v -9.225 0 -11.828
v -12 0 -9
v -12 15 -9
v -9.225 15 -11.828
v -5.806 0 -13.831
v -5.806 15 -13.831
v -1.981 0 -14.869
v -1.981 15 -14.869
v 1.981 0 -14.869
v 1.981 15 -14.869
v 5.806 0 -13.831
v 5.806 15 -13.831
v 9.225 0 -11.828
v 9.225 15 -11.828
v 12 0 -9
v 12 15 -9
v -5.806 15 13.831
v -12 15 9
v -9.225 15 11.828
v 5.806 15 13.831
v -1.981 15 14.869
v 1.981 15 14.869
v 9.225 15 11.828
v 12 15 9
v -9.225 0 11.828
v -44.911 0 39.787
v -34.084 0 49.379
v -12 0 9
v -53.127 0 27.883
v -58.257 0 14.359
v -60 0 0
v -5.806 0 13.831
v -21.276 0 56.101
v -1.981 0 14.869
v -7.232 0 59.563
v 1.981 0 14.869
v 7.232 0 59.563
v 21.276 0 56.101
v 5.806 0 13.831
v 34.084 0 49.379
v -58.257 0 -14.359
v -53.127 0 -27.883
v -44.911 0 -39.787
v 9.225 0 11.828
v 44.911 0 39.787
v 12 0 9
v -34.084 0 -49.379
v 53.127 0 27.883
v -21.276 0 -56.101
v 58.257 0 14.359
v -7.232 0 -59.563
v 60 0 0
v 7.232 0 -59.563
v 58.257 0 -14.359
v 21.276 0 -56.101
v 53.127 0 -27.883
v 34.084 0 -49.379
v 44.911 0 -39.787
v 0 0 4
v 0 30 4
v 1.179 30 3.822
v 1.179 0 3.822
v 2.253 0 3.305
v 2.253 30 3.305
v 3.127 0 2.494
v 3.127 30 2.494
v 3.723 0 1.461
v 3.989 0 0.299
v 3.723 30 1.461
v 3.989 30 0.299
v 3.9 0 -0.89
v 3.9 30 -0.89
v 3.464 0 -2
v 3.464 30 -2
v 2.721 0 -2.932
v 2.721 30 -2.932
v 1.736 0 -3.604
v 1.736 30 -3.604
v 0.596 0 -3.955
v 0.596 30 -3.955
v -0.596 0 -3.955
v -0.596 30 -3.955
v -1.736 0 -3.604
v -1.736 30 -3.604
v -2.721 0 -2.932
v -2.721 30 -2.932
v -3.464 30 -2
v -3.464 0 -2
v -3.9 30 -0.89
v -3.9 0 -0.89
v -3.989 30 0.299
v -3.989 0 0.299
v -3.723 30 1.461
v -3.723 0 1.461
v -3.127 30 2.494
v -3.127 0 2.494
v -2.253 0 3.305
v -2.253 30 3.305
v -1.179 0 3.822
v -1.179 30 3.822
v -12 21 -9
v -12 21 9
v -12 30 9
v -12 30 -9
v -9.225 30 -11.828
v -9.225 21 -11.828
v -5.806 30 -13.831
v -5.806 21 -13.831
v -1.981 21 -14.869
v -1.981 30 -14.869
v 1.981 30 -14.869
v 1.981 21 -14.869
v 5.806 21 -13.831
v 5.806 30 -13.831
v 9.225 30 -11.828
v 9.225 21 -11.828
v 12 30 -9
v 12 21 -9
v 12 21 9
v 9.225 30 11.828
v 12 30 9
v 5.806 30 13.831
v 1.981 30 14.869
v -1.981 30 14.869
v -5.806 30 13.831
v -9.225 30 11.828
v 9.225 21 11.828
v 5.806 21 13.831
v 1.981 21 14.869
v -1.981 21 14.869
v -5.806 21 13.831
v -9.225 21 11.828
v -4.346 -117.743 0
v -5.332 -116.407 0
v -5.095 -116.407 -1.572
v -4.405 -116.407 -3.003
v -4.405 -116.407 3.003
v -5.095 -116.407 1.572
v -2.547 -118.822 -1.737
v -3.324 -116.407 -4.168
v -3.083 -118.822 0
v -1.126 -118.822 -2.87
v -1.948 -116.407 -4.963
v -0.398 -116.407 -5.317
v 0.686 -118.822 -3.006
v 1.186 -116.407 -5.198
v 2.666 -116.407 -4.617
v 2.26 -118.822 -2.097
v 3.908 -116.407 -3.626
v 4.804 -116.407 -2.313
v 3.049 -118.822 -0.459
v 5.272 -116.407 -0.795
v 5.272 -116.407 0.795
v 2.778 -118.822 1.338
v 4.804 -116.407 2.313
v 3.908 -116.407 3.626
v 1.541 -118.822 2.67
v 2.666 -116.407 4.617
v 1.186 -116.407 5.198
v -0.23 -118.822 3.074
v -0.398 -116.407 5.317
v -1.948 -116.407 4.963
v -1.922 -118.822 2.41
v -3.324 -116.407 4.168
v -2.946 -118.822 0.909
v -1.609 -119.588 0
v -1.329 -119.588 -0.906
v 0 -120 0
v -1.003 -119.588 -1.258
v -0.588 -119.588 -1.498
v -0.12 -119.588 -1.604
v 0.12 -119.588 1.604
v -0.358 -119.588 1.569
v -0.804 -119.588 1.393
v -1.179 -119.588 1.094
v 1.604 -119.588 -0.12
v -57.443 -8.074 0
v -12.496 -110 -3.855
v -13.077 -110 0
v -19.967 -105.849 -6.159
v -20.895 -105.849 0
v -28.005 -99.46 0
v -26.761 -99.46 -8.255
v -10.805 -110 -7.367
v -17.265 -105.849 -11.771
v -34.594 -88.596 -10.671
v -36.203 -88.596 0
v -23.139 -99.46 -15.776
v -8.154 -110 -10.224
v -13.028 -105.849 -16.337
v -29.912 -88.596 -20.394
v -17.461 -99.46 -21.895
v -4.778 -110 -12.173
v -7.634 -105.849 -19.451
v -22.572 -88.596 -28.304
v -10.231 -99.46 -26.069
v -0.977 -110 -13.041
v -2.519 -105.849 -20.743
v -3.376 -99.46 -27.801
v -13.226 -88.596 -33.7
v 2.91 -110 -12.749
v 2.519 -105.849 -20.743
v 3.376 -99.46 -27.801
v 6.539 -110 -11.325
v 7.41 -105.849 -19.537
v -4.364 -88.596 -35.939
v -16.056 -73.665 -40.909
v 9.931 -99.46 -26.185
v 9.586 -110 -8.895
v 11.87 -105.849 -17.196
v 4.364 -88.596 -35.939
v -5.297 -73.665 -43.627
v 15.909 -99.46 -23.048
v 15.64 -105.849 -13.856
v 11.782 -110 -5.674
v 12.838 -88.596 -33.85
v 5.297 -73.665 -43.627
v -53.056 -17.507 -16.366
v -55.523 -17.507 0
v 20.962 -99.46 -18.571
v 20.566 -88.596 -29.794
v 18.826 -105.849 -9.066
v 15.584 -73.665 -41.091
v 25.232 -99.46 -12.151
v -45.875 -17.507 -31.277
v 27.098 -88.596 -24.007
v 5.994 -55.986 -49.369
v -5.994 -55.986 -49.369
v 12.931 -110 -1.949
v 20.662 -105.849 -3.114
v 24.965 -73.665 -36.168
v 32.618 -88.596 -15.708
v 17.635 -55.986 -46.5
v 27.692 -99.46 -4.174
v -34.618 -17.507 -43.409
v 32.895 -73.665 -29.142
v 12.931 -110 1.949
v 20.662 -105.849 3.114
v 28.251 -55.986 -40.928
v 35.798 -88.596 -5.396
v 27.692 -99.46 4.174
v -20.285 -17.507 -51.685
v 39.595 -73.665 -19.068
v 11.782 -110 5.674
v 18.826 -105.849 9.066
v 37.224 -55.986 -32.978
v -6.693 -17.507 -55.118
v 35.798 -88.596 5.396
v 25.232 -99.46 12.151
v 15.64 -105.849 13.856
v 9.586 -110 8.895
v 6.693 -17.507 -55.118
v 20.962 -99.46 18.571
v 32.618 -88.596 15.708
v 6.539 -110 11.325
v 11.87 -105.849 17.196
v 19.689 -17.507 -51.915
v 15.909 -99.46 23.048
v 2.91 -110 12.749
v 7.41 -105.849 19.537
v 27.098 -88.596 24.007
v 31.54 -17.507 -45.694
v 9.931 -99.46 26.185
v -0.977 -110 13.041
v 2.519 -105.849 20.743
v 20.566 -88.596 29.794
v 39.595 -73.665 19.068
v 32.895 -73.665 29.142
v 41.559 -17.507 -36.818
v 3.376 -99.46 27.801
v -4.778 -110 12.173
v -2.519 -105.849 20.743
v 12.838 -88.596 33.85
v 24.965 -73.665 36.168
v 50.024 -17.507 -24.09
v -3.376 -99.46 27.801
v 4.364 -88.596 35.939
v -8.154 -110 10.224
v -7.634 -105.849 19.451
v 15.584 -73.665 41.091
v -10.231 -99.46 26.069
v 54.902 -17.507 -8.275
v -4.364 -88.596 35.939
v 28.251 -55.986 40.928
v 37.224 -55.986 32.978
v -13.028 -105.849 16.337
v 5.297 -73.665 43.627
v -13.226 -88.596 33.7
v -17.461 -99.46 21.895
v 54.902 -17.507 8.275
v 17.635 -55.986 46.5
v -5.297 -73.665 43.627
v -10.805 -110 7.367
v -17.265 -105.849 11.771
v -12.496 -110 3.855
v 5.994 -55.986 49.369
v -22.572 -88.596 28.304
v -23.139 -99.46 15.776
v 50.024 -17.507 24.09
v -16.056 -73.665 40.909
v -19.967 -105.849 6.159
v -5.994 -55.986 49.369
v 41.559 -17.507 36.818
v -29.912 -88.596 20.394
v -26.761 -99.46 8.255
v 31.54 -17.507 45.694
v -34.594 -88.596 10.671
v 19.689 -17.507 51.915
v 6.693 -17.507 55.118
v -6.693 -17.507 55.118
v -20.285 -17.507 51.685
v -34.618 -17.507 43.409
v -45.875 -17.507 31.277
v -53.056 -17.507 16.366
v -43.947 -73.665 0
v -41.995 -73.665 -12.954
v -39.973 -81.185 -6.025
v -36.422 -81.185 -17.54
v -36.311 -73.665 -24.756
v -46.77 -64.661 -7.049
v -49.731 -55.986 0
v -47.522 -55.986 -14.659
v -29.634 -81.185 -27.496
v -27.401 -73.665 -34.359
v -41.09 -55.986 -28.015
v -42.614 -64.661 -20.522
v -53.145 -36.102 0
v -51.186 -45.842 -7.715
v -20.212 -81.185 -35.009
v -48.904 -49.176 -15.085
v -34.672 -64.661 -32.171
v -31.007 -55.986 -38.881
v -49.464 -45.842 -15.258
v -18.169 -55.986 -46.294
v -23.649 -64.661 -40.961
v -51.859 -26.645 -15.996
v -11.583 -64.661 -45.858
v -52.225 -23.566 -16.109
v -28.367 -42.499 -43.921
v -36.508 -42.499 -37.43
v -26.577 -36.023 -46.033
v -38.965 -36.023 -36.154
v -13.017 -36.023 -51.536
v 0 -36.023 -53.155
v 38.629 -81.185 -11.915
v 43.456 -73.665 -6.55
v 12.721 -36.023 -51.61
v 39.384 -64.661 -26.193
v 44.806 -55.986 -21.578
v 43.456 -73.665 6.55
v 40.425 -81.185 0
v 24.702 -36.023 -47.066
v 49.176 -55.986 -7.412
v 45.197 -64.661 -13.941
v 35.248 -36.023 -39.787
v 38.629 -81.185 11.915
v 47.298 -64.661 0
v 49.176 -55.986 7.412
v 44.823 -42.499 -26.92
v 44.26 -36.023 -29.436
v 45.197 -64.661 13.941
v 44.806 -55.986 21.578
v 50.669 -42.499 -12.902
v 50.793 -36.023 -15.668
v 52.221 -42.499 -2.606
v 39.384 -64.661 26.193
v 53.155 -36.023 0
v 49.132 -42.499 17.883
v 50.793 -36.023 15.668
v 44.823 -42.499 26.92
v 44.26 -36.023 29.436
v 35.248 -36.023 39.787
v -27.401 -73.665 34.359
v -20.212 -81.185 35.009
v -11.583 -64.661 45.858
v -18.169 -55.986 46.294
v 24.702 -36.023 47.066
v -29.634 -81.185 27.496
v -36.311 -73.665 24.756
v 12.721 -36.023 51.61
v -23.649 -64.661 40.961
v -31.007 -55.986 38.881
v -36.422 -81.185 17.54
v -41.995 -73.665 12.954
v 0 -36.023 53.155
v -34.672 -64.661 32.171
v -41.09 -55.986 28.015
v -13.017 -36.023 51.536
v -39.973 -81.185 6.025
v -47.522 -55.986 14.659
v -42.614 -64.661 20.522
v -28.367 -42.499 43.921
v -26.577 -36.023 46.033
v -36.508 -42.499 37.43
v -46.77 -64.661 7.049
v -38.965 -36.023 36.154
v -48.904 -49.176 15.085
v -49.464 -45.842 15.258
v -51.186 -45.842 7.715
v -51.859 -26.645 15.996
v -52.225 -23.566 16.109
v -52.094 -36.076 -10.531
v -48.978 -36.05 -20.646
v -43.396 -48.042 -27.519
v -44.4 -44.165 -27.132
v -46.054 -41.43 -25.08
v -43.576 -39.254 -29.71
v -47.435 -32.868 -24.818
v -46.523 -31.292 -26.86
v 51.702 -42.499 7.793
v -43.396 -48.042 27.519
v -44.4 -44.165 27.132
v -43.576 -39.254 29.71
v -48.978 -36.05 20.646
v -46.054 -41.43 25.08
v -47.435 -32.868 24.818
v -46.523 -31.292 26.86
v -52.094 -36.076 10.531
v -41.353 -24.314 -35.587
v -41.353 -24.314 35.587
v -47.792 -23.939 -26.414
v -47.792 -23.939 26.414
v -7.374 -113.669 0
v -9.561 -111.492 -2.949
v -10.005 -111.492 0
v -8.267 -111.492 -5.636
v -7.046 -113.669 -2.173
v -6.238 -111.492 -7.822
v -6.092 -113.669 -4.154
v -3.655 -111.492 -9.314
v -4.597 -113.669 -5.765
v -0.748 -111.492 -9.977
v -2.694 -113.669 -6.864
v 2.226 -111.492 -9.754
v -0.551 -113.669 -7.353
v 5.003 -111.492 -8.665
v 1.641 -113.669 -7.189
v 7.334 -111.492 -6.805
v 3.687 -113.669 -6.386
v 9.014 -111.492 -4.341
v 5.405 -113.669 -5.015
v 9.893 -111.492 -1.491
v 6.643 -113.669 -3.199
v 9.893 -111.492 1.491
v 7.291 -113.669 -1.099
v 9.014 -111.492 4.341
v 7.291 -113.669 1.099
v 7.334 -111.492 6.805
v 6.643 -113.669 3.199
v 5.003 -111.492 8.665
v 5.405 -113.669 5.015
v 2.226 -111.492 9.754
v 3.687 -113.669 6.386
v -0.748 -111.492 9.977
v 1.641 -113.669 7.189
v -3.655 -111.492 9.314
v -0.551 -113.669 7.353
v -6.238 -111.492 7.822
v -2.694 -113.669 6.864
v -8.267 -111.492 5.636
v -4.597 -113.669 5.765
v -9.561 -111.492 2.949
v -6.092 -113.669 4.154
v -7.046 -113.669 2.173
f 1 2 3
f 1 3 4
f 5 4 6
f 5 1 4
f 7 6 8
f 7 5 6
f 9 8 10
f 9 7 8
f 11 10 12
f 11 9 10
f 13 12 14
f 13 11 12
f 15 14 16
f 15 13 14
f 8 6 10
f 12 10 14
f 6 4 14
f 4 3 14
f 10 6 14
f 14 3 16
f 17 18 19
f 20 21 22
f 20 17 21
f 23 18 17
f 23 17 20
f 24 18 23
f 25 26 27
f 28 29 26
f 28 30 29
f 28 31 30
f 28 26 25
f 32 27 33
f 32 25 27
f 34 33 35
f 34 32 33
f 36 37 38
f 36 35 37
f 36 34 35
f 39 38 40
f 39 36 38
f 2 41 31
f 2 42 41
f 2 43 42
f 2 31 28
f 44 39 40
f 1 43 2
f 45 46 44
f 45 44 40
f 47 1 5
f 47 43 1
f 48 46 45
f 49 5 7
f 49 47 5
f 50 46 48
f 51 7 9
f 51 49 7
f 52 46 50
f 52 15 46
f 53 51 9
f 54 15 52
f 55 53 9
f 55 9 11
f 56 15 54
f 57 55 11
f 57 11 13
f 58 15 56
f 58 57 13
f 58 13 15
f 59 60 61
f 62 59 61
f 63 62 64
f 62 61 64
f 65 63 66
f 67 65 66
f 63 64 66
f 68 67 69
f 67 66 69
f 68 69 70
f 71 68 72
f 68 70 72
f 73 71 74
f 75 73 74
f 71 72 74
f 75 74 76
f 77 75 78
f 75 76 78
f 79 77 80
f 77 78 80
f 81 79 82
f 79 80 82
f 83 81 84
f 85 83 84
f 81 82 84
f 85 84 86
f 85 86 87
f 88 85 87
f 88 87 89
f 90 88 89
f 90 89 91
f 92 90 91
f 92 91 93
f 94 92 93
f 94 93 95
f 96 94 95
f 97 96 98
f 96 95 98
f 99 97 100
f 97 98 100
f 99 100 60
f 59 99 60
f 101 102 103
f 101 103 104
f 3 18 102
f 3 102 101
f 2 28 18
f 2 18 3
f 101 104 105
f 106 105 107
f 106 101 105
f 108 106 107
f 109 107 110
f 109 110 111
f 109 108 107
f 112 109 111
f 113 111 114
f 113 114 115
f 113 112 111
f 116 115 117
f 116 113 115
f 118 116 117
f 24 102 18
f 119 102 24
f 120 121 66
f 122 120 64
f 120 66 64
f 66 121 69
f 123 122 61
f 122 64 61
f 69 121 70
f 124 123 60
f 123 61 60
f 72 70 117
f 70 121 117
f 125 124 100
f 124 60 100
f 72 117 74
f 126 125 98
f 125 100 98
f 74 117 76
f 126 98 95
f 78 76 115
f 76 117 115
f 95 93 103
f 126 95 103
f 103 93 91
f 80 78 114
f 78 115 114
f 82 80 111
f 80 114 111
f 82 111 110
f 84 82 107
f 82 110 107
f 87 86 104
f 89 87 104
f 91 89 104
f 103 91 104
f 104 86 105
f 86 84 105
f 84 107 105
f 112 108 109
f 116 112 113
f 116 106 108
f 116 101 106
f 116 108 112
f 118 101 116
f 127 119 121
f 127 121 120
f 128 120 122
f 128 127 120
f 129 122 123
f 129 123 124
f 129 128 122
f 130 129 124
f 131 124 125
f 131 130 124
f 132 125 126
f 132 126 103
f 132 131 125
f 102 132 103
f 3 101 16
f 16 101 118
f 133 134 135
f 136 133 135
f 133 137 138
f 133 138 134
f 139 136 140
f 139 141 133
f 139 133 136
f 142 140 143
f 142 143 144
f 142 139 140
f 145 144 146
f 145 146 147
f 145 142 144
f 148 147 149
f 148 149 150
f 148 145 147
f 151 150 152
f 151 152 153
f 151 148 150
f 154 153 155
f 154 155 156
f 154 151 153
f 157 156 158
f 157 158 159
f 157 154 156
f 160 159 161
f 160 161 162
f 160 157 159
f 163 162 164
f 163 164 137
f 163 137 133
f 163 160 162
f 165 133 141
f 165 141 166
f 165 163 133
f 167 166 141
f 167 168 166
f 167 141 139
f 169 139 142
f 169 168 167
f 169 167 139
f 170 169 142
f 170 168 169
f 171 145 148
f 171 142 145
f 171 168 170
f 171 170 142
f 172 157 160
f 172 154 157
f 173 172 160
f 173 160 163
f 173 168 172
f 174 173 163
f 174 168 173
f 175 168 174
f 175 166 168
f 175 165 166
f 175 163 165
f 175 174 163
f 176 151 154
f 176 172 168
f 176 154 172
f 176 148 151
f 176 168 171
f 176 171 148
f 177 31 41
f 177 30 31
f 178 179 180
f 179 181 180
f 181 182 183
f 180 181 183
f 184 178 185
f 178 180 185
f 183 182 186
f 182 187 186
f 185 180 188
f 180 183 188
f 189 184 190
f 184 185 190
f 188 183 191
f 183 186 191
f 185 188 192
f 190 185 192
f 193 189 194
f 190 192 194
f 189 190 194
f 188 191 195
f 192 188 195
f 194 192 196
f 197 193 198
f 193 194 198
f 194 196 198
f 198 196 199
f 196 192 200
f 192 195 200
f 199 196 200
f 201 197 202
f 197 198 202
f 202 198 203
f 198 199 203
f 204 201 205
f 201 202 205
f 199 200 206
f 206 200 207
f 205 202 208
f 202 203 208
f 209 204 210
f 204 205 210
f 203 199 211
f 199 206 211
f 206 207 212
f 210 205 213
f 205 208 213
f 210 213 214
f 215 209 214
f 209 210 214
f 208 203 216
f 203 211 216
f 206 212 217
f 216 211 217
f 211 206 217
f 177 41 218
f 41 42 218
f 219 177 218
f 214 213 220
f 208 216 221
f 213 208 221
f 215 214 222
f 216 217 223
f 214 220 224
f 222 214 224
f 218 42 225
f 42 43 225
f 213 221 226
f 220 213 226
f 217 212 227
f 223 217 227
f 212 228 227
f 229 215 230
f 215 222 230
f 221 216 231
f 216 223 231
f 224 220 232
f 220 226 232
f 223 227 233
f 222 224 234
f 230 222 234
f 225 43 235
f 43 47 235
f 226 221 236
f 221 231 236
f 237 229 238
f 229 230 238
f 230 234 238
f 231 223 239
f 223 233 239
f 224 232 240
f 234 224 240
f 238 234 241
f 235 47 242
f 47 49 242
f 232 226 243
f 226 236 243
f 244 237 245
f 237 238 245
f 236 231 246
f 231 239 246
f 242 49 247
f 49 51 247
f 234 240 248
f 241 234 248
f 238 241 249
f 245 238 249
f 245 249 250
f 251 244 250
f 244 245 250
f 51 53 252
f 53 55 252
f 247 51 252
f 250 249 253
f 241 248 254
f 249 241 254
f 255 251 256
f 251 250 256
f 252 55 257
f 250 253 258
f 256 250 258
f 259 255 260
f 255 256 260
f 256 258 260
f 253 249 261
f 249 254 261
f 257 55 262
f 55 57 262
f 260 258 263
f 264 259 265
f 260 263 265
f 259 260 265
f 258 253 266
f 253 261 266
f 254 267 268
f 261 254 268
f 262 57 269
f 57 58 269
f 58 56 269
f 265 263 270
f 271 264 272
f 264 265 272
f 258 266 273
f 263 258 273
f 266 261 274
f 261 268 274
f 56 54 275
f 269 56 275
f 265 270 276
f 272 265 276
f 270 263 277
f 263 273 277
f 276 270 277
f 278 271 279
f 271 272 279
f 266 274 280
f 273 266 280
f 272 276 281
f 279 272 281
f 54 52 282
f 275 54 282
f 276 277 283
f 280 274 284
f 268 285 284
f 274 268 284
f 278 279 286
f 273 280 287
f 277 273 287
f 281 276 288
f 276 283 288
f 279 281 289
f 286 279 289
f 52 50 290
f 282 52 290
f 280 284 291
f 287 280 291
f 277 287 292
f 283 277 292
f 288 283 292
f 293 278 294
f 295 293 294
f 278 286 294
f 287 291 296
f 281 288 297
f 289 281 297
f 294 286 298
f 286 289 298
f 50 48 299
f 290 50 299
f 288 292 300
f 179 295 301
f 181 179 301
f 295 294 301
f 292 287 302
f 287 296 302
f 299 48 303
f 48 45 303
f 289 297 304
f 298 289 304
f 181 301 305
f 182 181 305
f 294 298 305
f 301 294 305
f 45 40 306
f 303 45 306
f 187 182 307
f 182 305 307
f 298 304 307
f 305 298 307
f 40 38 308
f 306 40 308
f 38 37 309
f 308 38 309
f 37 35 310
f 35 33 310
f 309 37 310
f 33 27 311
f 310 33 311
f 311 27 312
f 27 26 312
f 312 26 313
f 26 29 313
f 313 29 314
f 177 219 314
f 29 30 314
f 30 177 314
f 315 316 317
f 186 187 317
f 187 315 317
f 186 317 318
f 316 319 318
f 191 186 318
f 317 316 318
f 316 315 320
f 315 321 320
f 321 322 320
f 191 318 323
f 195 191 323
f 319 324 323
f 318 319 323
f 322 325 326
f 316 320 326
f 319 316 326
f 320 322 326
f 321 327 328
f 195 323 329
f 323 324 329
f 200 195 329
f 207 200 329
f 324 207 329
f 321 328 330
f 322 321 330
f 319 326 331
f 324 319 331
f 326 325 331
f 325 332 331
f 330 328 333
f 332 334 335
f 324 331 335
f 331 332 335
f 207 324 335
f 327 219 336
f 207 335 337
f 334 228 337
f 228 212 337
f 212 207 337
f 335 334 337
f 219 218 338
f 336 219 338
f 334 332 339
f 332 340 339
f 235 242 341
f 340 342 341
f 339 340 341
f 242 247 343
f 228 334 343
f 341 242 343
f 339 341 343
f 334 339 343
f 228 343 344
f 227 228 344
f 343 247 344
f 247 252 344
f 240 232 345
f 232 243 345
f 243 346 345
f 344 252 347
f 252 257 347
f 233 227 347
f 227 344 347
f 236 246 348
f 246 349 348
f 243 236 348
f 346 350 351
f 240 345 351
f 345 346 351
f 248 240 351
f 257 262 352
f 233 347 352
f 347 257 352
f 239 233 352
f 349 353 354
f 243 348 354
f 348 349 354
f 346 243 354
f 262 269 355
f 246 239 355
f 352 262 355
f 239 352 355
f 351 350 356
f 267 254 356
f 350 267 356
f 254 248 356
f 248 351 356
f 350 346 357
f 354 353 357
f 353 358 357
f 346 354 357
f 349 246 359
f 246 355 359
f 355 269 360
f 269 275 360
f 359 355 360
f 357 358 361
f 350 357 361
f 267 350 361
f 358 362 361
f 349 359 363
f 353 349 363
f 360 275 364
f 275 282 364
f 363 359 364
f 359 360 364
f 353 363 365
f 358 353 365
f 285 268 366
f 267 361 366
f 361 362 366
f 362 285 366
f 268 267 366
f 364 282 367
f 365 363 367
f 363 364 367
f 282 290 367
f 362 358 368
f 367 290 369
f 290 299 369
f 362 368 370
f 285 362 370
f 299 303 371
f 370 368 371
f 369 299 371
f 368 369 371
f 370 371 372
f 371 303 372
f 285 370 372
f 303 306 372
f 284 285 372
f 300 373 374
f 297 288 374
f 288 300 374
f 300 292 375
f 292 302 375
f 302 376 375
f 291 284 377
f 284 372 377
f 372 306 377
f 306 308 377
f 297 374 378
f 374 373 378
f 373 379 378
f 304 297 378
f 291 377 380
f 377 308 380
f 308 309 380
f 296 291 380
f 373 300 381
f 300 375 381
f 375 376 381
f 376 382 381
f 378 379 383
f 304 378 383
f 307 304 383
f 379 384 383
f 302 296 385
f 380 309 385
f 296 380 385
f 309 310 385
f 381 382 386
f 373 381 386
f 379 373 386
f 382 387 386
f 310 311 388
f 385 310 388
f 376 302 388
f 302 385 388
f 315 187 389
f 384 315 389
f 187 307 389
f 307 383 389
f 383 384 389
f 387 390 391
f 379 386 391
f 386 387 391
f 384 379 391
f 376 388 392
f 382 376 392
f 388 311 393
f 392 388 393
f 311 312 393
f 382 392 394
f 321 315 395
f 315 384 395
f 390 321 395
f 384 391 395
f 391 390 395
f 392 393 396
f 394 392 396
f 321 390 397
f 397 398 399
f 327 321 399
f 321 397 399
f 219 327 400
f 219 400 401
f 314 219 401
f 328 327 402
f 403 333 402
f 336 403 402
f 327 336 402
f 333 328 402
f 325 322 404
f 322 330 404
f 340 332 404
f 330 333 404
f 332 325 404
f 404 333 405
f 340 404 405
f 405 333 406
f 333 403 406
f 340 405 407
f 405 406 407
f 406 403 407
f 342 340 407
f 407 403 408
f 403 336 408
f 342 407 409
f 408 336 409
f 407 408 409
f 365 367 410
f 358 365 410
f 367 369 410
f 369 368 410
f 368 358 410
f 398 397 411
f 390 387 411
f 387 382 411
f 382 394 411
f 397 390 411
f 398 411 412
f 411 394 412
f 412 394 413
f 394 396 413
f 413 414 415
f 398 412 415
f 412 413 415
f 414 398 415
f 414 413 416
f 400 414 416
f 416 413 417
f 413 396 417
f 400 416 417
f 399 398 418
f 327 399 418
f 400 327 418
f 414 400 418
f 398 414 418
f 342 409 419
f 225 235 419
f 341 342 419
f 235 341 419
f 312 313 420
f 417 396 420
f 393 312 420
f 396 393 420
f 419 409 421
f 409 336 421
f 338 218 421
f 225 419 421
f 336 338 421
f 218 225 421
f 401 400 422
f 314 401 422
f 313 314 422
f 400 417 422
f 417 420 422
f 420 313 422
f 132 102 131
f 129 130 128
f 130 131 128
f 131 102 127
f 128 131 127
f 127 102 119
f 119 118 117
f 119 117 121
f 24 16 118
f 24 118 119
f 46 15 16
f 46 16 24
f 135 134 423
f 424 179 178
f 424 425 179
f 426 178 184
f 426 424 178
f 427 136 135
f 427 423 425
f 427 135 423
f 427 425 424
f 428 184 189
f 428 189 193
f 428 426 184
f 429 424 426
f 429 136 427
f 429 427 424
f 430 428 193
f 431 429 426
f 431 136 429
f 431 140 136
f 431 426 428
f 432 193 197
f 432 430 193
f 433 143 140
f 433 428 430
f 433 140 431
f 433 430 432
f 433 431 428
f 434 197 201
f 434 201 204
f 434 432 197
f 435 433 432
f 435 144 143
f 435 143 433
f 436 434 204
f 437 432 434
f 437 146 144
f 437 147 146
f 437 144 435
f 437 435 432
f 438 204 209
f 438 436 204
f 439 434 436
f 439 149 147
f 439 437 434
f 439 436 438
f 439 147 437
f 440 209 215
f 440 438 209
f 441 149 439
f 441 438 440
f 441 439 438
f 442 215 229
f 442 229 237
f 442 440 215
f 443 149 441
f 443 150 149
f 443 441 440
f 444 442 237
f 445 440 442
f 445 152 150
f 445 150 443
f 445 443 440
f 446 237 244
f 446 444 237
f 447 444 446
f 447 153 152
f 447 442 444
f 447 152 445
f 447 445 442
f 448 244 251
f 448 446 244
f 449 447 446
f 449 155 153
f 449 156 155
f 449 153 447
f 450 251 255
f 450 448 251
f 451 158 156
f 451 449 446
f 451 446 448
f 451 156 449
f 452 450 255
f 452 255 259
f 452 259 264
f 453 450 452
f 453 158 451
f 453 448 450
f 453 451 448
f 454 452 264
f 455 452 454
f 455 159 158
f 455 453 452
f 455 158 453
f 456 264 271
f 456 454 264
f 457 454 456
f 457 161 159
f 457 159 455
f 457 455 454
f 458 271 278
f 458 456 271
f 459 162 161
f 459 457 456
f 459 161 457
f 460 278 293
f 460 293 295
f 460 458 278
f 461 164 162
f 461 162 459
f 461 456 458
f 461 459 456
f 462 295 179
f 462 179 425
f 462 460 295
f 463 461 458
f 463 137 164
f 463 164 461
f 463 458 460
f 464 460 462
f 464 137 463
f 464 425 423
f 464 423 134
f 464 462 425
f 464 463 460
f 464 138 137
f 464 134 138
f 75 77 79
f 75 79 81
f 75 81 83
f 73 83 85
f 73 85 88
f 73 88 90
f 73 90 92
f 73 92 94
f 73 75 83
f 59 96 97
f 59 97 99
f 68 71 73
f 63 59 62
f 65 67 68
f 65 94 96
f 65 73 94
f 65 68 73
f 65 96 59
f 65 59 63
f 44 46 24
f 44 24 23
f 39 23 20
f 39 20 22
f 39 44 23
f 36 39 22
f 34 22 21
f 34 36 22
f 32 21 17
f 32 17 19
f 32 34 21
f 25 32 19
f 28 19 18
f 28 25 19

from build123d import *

# Parameters (mm, degrees)
BOSS_EXTRUDE1_DEPTH = 30
SKETCH3_R           = 4
CUT_EXTRUDE1_DEPTH  = 30
CUT_EXTRUDE2_REACH  = 152.867
SKETCH5_W           = 24
SKETCH5_H           = 6


with BuildPart() as part:
    # Sketch1 → Revolve5 (revolve)
    with BuildSketch(Plane.XY, mode=Mode.PRIVATE) as revolve5_sk:
        with BuildLine():
            Line((0, 0), (60, 0))
            add(Edge.make_bspline(
                [(13.077250629, -110), (26.441462871, -105.381596251), (58.400000122, -57.571050955), (51.598678878, -21.794632863), (60, 0)],
                knots=[0.017667594, 0.017667594, 0.017667594, 0.017667594, 0.353401106, 1, 1, 1, 1], degree=3))
            ThreePointArc((13.077250629, -110), (8.624288133, -112.501880222), (5.3315658, -116.406526078))
            ThreePointArc((5.3315658, -116.406526078), (3.082984988, -118.82225748), (0, -120))
            Line((0, -120), (0, 0))
        make_face()
    revolve(revolve5_sk.sketch.rotate(Axis((0, 0, 0), (0, -1, 0)), 180), axis=Axis((0, 0, 0), (0, -1, 0)))

    # Sketch2 → Boss-Extrude1 (add)
    with BuildSketch(Plane(origin=(0, 0, 0), x_dir=(1, 0, 0), z_dir=(0, 1, 0))):
        with BuildLine():
            Line((12, 9), (12, -9))
            ThreePointArc((12, -9), (0, -15), (-12, -9))
            Line((-12, -9), (-12, 9))
            ThreePointArc((-12, 9), (0, 15), (12, 9))
        make_face()
    extrude(amount=BOSS_EXTRUDE1_DEPTH)

    # Sketch3 → Cut-Extrude1 (cut)
    with BuildSketch(Plane(origin=(0, 30, 0), x_dir=(1, 0, 0), z_dir=(0, 1, 0))):
        with Locations(Location((0, 0, 0), (0, 0, 270))):
            Circle(SKETCH3_R)
    extrude(amount=-CUT_EXTRUDE1_DEPTH, mode=Mode.SUBTRACT)

    # Sketch5 → Cut-Extrude2 (cut, up to next)
    with BuildSketch(Plane.XY.offset(9), mode=Mode.PRIVATE) as cut_extrude2_sk1:
        with Locations((0, 18)):
            Rectangle(SKETCH5_W, SKETCH5_H)
    cut_extrude2_tool1 = extrude(cut_extrude2_sk1.sketch, amount=CUT_EXTRUDE2_REACH, mode=Mode.PRIVATE) & part.part
    cut_extrude2 = cut_extrude2_tool1.solids().sort_by_distance((0, 18, 9))[0]
    add(cut_extrude2, mode=Mode.SUBTRACT)

    # Mirror1: Cut-Extrude2 across plane
    add(cut_extrude2.mirror(Plane.XY), mode=Mode.SUBTRACT)


solid = part.part
